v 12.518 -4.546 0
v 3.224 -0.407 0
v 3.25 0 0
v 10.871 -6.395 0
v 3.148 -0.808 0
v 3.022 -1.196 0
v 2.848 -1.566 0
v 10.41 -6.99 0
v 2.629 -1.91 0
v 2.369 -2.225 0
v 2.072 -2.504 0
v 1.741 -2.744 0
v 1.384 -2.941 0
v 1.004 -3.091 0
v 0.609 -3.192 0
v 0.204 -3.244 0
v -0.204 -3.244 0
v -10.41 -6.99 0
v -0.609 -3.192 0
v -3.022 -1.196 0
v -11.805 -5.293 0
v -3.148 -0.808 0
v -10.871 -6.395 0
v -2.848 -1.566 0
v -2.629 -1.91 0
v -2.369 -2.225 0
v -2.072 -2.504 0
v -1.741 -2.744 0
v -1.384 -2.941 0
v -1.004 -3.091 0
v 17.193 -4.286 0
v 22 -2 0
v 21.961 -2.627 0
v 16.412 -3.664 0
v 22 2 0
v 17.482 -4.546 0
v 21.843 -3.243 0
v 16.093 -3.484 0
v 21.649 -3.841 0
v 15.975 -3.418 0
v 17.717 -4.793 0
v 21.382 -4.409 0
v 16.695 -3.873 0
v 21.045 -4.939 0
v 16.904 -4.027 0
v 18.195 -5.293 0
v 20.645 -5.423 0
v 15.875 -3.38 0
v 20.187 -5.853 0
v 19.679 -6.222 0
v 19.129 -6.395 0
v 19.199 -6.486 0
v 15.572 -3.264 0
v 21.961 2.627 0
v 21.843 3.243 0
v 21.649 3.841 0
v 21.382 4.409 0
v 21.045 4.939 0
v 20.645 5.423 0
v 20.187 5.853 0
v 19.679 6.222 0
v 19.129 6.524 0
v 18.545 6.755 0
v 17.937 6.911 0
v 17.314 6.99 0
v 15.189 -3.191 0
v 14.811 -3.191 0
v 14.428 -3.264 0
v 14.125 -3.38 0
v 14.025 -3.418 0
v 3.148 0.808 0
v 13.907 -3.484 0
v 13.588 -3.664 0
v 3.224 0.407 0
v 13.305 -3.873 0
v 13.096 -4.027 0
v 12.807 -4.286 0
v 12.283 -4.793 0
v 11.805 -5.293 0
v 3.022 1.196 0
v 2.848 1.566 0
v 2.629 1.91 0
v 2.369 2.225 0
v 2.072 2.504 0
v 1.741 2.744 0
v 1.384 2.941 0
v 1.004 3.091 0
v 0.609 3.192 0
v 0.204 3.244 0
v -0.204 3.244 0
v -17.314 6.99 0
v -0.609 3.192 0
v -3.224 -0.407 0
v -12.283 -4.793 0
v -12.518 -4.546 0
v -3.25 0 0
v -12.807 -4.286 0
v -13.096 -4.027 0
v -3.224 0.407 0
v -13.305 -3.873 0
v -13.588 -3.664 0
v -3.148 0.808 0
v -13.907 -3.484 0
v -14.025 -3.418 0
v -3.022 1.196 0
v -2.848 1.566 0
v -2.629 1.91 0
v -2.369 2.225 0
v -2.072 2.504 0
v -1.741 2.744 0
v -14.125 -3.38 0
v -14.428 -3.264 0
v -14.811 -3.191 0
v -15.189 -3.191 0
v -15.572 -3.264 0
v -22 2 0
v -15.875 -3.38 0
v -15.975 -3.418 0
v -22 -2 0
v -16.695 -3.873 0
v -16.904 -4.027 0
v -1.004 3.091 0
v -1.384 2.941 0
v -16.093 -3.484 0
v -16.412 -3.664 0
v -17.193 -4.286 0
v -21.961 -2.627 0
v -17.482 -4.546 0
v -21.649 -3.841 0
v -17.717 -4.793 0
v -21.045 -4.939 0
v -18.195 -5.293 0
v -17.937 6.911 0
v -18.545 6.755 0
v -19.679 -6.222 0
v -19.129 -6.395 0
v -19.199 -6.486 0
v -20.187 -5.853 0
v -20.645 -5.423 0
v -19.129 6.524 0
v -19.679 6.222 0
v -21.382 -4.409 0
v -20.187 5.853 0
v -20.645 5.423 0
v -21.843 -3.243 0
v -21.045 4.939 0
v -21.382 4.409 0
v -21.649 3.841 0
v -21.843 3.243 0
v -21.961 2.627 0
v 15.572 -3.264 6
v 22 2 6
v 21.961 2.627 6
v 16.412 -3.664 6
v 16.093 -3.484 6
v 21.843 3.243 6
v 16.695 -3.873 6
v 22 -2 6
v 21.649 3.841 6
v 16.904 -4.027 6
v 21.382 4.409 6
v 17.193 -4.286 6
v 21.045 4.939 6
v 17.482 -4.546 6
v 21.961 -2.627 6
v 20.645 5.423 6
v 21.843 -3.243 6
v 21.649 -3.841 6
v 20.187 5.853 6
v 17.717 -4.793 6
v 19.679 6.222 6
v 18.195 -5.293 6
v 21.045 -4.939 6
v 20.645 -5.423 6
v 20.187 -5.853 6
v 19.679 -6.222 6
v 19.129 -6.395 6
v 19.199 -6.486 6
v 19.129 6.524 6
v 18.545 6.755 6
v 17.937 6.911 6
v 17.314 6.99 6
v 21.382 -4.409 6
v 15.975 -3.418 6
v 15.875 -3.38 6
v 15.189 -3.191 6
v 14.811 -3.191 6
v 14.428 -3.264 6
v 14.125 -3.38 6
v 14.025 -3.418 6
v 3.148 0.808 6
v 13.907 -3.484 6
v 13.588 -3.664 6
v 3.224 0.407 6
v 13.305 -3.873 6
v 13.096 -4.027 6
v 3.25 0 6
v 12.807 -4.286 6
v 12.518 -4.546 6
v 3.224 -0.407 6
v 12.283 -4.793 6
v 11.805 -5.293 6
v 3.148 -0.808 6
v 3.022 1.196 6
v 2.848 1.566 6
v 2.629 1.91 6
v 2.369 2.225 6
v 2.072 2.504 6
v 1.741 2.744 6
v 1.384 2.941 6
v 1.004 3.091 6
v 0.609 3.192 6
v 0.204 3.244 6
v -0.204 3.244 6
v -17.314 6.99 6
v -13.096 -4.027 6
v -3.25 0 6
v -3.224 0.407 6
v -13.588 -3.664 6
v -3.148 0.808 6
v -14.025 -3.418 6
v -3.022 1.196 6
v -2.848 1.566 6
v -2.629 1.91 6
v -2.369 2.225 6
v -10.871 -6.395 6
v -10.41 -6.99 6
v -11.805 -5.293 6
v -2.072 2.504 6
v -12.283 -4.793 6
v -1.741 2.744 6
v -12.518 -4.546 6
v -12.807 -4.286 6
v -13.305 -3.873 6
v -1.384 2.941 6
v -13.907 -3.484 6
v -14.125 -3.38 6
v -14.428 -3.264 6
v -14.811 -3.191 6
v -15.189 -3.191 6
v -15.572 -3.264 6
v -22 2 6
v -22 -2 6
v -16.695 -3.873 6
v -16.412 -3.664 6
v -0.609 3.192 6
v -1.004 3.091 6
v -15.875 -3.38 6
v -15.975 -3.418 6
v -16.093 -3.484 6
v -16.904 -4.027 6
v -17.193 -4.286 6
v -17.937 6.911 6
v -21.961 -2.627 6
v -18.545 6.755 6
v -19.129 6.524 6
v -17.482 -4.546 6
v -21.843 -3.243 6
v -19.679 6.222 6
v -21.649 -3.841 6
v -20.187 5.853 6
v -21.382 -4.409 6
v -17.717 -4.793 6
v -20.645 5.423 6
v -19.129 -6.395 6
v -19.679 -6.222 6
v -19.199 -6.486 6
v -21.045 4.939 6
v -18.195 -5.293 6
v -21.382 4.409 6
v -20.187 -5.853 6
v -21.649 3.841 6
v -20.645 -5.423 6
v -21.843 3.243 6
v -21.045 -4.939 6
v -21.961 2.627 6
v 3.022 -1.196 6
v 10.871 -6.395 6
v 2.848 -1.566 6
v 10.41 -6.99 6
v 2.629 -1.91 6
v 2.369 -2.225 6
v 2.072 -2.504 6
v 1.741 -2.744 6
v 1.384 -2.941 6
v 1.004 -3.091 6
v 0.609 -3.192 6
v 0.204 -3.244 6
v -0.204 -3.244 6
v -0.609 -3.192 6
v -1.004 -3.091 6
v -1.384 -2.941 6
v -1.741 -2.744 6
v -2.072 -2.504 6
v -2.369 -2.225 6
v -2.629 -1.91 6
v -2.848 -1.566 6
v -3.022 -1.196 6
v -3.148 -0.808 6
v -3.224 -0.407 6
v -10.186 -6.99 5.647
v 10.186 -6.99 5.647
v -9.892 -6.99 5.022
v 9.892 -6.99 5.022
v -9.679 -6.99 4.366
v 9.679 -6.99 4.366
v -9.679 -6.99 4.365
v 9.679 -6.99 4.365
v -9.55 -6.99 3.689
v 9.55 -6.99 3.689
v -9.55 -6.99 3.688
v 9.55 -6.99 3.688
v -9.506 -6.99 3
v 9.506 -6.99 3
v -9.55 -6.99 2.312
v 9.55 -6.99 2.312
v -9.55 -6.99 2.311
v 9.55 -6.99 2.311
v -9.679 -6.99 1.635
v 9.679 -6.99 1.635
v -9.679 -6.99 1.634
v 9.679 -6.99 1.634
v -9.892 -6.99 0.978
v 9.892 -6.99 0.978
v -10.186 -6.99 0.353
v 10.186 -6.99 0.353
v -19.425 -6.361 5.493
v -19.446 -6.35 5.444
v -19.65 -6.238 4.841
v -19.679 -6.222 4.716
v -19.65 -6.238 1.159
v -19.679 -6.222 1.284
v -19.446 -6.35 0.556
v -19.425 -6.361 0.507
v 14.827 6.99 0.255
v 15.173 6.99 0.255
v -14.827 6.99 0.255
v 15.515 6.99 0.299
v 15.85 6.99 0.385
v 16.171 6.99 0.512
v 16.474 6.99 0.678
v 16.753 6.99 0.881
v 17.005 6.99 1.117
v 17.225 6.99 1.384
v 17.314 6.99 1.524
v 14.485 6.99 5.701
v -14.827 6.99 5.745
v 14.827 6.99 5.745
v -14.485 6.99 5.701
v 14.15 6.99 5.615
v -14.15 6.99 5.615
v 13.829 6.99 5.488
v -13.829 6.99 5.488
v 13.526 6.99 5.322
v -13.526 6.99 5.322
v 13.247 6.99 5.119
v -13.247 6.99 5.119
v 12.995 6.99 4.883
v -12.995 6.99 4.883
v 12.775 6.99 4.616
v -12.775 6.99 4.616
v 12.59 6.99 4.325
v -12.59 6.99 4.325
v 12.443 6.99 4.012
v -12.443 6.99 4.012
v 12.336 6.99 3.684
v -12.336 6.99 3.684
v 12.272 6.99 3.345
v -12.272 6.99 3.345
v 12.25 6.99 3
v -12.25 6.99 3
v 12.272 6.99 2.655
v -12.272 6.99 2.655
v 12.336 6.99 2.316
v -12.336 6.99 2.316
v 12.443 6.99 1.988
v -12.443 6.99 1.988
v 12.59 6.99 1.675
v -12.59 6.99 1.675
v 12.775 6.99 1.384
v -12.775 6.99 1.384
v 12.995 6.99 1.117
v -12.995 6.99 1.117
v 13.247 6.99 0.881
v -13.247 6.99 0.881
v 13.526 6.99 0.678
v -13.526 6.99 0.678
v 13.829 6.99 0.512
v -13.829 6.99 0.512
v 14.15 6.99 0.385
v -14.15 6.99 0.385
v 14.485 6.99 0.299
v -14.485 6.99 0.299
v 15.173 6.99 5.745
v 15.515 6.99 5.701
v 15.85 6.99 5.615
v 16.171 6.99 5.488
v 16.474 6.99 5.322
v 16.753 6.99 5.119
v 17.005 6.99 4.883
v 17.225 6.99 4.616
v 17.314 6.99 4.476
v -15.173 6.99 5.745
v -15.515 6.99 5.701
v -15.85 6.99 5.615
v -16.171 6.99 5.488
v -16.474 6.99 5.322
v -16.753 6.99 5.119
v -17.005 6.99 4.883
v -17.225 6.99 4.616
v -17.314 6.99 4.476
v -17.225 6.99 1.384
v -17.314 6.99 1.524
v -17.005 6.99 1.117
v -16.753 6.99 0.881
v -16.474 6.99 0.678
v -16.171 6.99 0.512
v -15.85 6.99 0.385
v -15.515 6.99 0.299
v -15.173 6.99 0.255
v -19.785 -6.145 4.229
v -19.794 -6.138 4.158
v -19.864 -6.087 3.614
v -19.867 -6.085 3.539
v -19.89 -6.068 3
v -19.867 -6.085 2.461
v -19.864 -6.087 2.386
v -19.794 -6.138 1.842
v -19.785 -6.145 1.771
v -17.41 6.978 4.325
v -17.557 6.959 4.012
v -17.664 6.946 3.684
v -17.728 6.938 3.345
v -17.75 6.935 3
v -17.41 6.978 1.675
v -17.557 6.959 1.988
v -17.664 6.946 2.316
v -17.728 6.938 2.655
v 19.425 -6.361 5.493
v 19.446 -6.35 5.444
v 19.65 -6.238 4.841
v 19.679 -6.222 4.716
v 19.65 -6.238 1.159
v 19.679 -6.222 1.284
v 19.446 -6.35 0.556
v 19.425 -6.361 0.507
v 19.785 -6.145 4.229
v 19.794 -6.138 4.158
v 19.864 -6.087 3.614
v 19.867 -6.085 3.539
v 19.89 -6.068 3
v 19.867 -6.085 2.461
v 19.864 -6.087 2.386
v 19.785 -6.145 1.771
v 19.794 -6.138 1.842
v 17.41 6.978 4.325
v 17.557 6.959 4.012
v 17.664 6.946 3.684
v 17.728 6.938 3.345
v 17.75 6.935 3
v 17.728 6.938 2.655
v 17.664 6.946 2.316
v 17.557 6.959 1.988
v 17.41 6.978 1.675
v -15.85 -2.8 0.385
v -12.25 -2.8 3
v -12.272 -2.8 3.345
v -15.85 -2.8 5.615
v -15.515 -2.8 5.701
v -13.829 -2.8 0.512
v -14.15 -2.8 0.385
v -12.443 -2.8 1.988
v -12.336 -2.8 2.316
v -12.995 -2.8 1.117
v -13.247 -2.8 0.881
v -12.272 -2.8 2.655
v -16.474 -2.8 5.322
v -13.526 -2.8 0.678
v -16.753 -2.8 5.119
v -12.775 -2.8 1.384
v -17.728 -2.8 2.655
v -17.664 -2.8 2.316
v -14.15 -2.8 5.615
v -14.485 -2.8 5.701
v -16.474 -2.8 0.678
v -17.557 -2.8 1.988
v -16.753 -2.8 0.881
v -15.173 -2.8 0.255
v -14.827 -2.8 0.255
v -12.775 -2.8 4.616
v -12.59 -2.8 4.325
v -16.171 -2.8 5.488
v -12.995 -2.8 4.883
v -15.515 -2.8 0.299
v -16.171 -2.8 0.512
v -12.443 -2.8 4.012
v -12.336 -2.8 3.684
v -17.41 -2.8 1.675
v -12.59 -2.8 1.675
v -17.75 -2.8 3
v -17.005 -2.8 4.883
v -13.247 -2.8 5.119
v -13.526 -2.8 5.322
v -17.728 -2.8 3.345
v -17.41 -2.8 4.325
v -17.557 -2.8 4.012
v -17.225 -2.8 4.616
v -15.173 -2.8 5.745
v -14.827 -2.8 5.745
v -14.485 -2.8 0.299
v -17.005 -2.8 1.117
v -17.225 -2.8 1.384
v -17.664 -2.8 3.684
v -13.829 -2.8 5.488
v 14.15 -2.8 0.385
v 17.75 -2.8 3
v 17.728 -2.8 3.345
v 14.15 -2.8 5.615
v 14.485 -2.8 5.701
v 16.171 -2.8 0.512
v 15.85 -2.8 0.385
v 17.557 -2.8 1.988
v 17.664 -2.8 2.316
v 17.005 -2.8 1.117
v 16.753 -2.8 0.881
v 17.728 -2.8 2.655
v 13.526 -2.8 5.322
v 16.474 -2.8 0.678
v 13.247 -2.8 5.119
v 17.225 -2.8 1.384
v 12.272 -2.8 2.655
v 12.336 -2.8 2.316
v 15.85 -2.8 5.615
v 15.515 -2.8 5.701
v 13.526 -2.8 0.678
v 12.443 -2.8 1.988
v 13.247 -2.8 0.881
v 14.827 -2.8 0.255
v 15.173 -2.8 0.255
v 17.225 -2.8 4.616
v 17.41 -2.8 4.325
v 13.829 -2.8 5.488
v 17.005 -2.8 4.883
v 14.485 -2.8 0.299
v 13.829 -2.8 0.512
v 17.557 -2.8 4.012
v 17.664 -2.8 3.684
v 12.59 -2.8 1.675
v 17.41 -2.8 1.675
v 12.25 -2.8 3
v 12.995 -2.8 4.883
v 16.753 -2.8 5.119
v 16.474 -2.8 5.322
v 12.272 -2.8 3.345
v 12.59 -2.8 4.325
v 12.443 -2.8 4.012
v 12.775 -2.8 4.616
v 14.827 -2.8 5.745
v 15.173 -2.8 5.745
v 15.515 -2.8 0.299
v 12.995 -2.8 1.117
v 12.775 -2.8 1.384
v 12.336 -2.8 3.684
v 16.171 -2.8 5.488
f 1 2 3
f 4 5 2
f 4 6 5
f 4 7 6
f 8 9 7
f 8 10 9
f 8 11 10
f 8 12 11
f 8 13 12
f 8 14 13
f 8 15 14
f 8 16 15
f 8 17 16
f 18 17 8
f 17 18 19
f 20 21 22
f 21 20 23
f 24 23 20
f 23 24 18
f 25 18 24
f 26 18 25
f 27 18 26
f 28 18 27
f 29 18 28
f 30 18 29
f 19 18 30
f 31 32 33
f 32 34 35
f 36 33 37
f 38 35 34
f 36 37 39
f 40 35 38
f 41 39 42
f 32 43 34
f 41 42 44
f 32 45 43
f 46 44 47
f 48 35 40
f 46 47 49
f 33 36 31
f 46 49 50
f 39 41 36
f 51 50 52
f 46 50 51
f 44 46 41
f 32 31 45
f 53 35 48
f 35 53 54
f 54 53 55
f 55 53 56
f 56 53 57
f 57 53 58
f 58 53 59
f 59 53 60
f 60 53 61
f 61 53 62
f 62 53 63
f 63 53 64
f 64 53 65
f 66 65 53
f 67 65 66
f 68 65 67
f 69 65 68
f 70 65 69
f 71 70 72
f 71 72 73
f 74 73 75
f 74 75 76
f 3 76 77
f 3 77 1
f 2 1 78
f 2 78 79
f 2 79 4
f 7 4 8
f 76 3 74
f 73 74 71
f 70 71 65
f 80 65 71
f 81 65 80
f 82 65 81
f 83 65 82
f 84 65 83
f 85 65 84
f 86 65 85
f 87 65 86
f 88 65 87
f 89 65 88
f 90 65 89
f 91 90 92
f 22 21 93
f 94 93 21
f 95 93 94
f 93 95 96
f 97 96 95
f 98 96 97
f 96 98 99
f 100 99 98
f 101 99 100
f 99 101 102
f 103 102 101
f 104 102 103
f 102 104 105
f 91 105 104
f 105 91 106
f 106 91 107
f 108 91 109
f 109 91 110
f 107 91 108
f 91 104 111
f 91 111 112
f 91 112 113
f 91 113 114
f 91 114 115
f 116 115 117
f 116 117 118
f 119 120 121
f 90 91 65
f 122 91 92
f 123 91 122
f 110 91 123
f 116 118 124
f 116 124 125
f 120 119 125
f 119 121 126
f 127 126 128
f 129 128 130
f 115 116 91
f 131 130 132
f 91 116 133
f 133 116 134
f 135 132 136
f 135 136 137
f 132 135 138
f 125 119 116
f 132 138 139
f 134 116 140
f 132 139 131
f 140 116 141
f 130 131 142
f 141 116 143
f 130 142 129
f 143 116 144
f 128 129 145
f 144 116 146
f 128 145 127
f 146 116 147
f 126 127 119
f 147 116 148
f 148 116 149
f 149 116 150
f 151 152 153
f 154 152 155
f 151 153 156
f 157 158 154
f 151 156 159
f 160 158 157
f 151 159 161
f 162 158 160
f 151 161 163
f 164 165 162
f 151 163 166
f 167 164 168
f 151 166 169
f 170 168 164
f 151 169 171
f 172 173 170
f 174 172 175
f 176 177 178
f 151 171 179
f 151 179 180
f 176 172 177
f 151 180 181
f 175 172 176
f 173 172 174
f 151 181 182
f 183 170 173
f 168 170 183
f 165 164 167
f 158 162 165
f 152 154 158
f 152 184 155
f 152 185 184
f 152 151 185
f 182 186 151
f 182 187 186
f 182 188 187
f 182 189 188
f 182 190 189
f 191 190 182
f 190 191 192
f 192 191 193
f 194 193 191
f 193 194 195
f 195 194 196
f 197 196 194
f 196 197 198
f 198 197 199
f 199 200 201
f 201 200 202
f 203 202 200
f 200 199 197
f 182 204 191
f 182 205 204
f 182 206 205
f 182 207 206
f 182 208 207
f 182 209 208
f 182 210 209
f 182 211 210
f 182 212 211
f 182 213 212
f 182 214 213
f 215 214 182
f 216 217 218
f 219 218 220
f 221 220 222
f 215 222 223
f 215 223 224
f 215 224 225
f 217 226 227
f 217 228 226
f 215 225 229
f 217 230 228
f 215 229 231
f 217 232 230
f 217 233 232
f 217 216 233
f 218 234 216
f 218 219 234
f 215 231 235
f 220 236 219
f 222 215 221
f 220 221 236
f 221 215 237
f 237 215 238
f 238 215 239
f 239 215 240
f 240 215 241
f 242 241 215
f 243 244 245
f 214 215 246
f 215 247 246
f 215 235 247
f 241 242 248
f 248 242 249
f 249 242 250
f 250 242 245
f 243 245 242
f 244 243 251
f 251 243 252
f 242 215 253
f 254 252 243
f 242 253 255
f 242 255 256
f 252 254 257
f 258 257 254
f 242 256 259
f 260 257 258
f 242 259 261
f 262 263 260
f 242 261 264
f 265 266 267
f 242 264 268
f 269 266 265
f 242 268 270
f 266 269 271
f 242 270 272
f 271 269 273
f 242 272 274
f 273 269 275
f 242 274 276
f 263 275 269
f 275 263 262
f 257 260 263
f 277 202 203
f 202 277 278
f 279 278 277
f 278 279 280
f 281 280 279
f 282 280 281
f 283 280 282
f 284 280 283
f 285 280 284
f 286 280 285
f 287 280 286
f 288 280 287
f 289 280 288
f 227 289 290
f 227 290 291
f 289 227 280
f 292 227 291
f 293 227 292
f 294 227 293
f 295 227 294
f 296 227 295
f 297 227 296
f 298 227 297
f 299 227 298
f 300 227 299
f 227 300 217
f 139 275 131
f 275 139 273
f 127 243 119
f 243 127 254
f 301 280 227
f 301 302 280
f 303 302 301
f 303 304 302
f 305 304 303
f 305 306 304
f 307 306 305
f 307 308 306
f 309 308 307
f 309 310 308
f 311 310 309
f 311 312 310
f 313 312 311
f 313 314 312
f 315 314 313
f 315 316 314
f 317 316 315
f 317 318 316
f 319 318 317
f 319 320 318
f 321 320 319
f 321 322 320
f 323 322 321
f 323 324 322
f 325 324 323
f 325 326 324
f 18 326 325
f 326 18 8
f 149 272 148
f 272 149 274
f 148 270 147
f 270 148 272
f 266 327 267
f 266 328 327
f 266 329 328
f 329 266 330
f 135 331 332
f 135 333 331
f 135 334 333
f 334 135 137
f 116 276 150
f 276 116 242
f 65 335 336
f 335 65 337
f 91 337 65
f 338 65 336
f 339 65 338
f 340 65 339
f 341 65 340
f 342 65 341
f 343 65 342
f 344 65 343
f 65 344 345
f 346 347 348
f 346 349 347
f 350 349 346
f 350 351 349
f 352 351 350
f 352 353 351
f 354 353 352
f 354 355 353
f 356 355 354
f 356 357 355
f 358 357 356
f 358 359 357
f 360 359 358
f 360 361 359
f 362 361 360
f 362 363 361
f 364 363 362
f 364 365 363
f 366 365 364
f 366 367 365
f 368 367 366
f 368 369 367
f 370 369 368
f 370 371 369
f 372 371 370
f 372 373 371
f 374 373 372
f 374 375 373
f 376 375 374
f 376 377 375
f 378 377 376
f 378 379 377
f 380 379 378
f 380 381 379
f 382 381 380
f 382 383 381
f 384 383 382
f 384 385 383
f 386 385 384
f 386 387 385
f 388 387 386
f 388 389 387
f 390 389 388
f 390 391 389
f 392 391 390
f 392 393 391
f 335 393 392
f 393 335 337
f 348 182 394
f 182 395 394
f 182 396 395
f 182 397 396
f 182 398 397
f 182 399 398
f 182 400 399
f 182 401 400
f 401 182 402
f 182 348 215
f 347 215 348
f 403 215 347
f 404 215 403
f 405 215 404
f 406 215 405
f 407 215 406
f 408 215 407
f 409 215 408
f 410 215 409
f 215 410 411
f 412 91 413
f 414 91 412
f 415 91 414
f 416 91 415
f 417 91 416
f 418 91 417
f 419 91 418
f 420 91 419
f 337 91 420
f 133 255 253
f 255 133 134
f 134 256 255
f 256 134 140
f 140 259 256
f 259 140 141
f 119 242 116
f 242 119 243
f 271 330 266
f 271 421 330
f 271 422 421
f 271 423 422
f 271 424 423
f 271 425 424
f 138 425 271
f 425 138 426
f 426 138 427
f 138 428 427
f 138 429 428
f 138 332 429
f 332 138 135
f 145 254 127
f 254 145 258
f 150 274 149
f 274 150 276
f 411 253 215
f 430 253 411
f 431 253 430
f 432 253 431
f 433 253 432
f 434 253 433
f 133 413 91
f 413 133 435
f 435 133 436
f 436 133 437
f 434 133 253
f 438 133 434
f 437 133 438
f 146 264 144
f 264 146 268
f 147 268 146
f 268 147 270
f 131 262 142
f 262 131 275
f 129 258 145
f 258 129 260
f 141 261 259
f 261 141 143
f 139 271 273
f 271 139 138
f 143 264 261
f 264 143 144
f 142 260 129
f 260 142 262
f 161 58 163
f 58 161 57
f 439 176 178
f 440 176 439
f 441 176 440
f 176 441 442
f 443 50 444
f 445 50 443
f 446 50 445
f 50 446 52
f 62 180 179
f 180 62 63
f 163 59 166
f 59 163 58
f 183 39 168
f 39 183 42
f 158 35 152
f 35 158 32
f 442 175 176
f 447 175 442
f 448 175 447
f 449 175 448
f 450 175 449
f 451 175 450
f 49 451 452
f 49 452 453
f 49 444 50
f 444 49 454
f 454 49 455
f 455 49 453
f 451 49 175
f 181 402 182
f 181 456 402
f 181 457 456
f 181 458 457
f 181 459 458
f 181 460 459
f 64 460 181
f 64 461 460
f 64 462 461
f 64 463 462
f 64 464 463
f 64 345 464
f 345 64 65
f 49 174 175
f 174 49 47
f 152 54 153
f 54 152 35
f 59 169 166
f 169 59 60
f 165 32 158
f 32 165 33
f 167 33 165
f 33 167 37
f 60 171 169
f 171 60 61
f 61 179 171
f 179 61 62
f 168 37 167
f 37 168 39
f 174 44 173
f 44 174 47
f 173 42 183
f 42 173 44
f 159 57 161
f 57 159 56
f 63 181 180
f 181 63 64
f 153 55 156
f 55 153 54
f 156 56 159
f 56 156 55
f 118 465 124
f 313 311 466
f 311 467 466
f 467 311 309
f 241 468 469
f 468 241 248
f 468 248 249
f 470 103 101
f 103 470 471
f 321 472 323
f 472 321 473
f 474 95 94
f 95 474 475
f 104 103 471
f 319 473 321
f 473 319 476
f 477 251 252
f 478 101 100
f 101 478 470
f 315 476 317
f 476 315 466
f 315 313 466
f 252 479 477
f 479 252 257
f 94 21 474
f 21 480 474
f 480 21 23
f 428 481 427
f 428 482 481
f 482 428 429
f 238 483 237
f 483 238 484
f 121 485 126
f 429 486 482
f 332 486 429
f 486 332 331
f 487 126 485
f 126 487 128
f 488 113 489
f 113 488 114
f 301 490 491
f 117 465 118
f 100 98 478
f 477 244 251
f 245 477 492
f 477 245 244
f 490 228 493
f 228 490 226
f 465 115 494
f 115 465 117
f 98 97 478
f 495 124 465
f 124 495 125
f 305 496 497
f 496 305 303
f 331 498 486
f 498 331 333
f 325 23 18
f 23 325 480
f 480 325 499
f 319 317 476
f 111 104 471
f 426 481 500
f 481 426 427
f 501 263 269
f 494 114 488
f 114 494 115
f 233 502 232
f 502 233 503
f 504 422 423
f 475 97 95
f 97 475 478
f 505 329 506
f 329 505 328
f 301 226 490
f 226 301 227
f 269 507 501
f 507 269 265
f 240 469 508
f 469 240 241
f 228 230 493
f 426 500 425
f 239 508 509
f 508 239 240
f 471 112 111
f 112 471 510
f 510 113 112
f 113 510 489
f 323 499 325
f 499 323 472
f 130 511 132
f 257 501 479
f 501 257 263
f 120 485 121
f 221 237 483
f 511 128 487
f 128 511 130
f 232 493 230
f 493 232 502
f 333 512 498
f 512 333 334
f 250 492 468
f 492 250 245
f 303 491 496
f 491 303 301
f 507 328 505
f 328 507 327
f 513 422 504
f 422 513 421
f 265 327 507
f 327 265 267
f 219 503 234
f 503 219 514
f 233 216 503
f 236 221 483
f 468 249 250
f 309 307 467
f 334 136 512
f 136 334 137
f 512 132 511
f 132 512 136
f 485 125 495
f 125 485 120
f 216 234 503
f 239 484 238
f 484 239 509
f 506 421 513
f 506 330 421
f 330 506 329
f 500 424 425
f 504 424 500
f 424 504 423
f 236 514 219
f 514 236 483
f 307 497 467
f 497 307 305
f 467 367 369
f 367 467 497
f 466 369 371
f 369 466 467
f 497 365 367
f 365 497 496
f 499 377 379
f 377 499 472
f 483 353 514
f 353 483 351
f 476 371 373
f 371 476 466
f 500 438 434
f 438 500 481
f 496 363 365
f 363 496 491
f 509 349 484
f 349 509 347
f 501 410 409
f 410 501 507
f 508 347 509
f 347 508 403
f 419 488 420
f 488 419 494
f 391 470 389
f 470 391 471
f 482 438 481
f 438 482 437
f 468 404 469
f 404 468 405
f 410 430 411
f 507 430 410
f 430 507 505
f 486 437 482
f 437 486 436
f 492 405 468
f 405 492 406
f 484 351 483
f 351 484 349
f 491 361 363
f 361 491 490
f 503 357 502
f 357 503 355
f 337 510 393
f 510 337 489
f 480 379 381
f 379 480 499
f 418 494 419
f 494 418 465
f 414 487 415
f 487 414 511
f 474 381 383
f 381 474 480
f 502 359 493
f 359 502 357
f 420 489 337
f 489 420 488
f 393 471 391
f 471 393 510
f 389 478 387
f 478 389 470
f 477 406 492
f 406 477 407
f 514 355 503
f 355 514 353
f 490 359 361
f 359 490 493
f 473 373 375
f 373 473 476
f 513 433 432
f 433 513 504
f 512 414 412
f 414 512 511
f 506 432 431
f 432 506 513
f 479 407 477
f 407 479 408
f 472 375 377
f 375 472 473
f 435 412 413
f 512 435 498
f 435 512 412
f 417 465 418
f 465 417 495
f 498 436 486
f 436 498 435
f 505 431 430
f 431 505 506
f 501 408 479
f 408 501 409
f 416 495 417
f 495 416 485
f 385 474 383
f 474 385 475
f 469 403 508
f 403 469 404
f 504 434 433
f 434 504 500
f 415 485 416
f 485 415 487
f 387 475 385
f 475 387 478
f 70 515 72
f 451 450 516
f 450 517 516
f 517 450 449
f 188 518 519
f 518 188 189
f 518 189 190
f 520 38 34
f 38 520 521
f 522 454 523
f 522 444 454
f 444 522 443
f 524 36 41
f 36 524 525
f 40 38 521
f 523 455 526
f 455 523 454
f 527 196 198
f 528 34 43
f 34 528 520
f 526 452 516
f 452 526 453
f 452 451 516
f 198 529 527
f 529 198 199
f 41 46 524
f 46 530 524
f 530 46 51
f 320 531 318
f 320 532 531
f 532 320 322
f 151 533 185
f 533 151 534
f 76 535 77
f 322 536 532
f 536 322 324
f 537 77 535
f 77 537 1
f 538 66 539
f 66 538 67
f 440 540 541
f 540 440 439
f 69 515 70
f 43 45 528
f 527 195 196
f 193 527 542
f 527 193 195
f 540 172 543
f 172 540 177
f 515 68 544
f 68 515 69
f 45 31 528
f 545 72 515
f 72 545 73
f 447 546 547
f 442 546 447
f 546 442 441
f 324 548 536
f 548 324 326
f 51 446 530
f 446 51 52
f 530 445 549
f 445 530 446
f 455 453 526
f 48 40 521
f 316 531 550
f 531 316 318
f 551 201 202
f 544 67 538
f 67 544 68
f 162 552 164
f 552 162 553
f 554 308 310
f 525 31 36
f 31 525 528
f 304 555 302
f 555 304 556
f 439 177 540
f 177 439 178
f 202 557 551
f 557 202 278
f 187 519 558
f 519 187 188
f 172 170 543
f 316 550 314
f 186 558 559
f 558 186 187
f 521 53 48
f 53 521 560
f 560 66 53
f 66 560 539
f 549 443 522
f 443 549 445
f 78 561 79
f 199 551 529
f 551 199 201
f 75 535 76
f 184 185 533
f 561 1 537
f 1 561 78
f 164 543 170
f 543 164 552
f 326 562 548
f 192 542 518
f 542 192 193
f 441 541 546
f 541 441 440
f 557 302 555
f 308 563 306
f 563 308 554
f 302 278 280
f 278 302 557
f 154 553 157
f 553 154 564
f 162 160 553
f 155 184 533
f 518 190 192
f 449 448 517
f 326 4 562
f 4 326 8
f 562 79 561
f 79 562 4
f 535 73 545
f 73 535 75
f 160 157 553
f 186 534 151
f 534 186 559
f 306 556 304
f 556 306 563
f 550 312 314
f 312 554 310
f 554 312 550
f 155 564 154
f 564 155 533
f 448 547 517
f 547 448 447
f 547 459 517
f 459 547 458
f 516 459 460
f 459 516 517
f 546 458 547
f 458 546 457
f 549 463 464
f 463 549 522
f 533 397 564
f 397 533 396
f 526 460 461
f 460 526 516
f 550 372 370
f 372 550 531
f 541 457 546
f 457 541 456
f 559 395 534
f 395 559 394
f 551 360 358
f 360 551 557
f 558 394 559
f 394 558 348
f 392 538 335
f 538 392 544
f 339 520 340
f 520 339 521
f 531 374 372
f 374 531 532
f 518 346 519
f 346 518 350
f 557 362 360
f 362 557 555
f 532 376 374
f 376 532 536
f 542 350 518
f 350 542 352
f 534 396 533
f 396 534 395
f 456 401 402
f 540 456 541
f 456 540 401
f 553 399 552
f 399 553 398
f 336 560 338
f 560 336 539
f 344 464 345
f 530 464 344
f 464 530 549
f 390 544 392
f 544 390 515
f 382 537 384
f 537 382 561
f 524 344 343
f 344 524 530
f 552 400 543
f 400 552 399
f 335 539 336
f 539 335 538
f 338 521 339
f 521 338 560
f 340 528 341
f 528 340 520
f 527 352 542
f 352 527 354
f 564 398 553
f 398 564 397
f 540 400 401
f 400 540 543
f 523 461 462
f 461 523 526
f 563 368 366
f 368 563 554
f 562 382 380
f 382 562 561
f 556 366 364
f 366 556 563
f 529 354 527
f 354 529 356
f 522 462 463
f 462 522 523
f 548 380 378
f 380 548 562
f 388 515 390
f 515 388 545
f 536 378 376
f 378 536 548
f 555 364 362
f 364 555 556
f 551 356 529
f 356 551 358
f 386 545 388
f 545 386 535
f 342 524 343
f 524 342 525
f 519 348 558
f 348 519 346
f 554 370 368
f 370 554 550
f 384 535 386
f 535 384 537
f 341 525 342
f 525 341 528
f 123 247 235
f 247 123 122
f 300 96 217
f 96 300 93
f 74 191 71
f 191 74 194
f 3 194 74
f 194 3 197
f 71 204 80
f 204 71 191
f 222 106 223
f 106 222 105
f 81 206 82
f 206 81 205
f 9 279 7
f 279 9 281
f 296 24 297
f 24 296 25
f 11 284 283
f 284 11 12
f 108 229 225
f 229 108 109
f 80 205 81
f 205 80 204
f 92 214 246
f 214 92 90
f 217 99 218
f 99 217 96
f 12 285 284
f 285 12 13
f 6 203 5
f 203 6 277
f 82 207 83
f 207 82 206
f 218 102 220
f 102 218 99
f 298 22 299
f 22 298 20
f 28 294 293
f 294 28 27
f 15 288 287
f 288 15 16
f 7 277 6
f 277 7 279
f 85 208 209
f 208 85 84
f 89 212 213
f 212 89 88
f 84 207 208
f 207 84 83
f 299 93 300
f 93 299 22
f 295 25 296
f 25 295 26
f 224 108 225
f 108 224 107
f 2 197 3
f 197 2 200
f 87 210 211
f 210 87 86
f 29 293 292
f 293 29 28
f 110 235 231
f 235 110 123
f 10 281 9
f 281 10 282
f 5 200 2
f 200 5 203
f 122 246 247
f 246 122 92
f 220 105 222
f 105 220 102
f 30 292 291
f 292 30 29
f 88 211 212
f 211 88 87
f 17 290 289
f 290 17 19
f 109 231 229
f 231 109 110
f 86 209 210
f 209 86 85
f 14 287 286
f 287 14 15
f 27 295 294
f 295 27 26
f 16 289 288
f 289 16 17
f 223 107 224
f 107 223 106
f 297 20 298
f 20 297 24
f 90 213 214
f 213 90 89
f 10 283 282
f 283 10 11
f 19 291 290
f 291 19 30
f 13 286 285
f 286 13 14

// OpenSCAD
$fn = 50;


difference() {
	union() {
		cylinder(h = 6, r = 7.0000000000);
		translate(v = [-7.5000000000, 0.0000000000, 0]) {
			hull() {
				translate(v = [-9.5000000000, 2.0000000000, 0]) {
					cylinder(h = 6, r = 5);
				}
				translate(v = [9.5000000000, 2.0000000000, 0]) {
					cylinder(h = 6, r = 5);
				}
				translate(v = [-9.5000000000, -2.0000000000, 0]) {
					cylinder(h = 6, r = 5);
				}
				translate(v = [9.5000000000, -2.0000000000, 0]) {
					cylinder(h = 6, r = 5);
				}
			}
		}
		translate(v = [-7.5000000000, 0.0000000000, 0]) {
			hull() {
				translate(v = [-9.5000000000, 2.0000000000, 0]) {
					cylinder(h = 6, r = 5);
				}
				translate(v = [9.5000000000, 2.0000000000, 0]) {
					cylinder(h = 6, r = 5);
				}
				translate(v = [-9.5000000000, -2.0000000000, 0]) {
					cylinder(h = 6, r = 5);
				}
				translate(v = [9.5000000000, -2.0000000000, 0]) {
					cylinder(h = 6, r = 5);
				}
			}
		}
		translate(v = [7.5000000000, 0.0000000000, 0]) {
			hull() {
				translate(v = [-9.5000000000, 2.0000000000, 0]) {
					cylinder(h = 6, r = 5);
				}
				translate(v = [9.5000000000, 2.0000000000, 0]) {
					cylinder(h = 6, r = 5);
				}
				translate(v = [-9.5000000000, -2.0000000000, 0]) {
					cylinder(h = 6, r = 5);
				}
				translate(v = [9.5000000000, -2.0000000000, 0]) {
					cylinder(h = 6, r = 5);
				}
			}
		}
		translate(v = [7.5000000000, 0.0000000000, 0]) {
			hull() {
				translate(v = [-9.5000000000, 2.0000000000, 0]) {
					cylinder(h = 6, r = 5);
				}
				translate(v = [9.5000000000, 2.0000000000, 0]) {
					cylinder(h = 6, r = 5);
				}
				translate(v = [-9.5000000000, -2.0000000000, 0]) {
					cylinder(h = 6, r = 5);
				}
				translate(v = [9.5000000000, -2.0000000000, 0]) {
					cylinder(h = 6, r = 5);
				}
			}
		}
	}
	union() {
		translate(v = [-15.0000000000, -7.0000000000, 3.0000000000]) {
			rotate(a = [90, 0, 0]) {
				difference() {
					union() {
						#translate(v = [0, 0, -14.0000000000]) {
							cylinder(h = 14, r = 2.2500000000);
						}
						#translate(v = [0, 0, -4.2000000000]) {
							cylinder(h = 4.2000000000, r1 = 2.7500000000, r2 = 5.5000000000);
						}
						#translate(v = [0, 0, -14.0000000000]) {
							cylinder(h = 14, r = 2.7500000000);
						}
						#translate(v = [0, 0, -14.0000000000]) {
							cylinder(h = 14, r = 2.2500000000);
						}
					}
					union();
				}
			}
		}
		translate(v = [15.0000000000, -7.0000000000, 3.0000000000]) {
			rotate(a = [90, 0, 0]) {
				difference() {
					union() {
						#translate(v = [0, 0, -14.0000000000]) {
							cylinder(h = 14, r = 2.2500000000);
						}
						#translate(v = [0, 0, -4.2000000000]) {
							cylinder(h = 4.2000000000, r1 = 2.7500000000, r2 = 5.5000000000);
						}
						#translate(v = [0, 0, -14.0000000000]) {
							cylinder(h = 14, r = 2.7500000000);
						}
						#translate(v = [0, 0, -14.0000000000]) {
							cylinder(h = 14, r = 2.2500000000);
						}
					}
					union();
				}
			}
		}
		translate(v = [0, 0, -100]) {
			cylinder(h = 200, r = 3.2500000000);
		}
		translate(v = [0, 0, -100]) {
			cylinder(h = 200, r = 1.8000000000);
		}
	}
}
